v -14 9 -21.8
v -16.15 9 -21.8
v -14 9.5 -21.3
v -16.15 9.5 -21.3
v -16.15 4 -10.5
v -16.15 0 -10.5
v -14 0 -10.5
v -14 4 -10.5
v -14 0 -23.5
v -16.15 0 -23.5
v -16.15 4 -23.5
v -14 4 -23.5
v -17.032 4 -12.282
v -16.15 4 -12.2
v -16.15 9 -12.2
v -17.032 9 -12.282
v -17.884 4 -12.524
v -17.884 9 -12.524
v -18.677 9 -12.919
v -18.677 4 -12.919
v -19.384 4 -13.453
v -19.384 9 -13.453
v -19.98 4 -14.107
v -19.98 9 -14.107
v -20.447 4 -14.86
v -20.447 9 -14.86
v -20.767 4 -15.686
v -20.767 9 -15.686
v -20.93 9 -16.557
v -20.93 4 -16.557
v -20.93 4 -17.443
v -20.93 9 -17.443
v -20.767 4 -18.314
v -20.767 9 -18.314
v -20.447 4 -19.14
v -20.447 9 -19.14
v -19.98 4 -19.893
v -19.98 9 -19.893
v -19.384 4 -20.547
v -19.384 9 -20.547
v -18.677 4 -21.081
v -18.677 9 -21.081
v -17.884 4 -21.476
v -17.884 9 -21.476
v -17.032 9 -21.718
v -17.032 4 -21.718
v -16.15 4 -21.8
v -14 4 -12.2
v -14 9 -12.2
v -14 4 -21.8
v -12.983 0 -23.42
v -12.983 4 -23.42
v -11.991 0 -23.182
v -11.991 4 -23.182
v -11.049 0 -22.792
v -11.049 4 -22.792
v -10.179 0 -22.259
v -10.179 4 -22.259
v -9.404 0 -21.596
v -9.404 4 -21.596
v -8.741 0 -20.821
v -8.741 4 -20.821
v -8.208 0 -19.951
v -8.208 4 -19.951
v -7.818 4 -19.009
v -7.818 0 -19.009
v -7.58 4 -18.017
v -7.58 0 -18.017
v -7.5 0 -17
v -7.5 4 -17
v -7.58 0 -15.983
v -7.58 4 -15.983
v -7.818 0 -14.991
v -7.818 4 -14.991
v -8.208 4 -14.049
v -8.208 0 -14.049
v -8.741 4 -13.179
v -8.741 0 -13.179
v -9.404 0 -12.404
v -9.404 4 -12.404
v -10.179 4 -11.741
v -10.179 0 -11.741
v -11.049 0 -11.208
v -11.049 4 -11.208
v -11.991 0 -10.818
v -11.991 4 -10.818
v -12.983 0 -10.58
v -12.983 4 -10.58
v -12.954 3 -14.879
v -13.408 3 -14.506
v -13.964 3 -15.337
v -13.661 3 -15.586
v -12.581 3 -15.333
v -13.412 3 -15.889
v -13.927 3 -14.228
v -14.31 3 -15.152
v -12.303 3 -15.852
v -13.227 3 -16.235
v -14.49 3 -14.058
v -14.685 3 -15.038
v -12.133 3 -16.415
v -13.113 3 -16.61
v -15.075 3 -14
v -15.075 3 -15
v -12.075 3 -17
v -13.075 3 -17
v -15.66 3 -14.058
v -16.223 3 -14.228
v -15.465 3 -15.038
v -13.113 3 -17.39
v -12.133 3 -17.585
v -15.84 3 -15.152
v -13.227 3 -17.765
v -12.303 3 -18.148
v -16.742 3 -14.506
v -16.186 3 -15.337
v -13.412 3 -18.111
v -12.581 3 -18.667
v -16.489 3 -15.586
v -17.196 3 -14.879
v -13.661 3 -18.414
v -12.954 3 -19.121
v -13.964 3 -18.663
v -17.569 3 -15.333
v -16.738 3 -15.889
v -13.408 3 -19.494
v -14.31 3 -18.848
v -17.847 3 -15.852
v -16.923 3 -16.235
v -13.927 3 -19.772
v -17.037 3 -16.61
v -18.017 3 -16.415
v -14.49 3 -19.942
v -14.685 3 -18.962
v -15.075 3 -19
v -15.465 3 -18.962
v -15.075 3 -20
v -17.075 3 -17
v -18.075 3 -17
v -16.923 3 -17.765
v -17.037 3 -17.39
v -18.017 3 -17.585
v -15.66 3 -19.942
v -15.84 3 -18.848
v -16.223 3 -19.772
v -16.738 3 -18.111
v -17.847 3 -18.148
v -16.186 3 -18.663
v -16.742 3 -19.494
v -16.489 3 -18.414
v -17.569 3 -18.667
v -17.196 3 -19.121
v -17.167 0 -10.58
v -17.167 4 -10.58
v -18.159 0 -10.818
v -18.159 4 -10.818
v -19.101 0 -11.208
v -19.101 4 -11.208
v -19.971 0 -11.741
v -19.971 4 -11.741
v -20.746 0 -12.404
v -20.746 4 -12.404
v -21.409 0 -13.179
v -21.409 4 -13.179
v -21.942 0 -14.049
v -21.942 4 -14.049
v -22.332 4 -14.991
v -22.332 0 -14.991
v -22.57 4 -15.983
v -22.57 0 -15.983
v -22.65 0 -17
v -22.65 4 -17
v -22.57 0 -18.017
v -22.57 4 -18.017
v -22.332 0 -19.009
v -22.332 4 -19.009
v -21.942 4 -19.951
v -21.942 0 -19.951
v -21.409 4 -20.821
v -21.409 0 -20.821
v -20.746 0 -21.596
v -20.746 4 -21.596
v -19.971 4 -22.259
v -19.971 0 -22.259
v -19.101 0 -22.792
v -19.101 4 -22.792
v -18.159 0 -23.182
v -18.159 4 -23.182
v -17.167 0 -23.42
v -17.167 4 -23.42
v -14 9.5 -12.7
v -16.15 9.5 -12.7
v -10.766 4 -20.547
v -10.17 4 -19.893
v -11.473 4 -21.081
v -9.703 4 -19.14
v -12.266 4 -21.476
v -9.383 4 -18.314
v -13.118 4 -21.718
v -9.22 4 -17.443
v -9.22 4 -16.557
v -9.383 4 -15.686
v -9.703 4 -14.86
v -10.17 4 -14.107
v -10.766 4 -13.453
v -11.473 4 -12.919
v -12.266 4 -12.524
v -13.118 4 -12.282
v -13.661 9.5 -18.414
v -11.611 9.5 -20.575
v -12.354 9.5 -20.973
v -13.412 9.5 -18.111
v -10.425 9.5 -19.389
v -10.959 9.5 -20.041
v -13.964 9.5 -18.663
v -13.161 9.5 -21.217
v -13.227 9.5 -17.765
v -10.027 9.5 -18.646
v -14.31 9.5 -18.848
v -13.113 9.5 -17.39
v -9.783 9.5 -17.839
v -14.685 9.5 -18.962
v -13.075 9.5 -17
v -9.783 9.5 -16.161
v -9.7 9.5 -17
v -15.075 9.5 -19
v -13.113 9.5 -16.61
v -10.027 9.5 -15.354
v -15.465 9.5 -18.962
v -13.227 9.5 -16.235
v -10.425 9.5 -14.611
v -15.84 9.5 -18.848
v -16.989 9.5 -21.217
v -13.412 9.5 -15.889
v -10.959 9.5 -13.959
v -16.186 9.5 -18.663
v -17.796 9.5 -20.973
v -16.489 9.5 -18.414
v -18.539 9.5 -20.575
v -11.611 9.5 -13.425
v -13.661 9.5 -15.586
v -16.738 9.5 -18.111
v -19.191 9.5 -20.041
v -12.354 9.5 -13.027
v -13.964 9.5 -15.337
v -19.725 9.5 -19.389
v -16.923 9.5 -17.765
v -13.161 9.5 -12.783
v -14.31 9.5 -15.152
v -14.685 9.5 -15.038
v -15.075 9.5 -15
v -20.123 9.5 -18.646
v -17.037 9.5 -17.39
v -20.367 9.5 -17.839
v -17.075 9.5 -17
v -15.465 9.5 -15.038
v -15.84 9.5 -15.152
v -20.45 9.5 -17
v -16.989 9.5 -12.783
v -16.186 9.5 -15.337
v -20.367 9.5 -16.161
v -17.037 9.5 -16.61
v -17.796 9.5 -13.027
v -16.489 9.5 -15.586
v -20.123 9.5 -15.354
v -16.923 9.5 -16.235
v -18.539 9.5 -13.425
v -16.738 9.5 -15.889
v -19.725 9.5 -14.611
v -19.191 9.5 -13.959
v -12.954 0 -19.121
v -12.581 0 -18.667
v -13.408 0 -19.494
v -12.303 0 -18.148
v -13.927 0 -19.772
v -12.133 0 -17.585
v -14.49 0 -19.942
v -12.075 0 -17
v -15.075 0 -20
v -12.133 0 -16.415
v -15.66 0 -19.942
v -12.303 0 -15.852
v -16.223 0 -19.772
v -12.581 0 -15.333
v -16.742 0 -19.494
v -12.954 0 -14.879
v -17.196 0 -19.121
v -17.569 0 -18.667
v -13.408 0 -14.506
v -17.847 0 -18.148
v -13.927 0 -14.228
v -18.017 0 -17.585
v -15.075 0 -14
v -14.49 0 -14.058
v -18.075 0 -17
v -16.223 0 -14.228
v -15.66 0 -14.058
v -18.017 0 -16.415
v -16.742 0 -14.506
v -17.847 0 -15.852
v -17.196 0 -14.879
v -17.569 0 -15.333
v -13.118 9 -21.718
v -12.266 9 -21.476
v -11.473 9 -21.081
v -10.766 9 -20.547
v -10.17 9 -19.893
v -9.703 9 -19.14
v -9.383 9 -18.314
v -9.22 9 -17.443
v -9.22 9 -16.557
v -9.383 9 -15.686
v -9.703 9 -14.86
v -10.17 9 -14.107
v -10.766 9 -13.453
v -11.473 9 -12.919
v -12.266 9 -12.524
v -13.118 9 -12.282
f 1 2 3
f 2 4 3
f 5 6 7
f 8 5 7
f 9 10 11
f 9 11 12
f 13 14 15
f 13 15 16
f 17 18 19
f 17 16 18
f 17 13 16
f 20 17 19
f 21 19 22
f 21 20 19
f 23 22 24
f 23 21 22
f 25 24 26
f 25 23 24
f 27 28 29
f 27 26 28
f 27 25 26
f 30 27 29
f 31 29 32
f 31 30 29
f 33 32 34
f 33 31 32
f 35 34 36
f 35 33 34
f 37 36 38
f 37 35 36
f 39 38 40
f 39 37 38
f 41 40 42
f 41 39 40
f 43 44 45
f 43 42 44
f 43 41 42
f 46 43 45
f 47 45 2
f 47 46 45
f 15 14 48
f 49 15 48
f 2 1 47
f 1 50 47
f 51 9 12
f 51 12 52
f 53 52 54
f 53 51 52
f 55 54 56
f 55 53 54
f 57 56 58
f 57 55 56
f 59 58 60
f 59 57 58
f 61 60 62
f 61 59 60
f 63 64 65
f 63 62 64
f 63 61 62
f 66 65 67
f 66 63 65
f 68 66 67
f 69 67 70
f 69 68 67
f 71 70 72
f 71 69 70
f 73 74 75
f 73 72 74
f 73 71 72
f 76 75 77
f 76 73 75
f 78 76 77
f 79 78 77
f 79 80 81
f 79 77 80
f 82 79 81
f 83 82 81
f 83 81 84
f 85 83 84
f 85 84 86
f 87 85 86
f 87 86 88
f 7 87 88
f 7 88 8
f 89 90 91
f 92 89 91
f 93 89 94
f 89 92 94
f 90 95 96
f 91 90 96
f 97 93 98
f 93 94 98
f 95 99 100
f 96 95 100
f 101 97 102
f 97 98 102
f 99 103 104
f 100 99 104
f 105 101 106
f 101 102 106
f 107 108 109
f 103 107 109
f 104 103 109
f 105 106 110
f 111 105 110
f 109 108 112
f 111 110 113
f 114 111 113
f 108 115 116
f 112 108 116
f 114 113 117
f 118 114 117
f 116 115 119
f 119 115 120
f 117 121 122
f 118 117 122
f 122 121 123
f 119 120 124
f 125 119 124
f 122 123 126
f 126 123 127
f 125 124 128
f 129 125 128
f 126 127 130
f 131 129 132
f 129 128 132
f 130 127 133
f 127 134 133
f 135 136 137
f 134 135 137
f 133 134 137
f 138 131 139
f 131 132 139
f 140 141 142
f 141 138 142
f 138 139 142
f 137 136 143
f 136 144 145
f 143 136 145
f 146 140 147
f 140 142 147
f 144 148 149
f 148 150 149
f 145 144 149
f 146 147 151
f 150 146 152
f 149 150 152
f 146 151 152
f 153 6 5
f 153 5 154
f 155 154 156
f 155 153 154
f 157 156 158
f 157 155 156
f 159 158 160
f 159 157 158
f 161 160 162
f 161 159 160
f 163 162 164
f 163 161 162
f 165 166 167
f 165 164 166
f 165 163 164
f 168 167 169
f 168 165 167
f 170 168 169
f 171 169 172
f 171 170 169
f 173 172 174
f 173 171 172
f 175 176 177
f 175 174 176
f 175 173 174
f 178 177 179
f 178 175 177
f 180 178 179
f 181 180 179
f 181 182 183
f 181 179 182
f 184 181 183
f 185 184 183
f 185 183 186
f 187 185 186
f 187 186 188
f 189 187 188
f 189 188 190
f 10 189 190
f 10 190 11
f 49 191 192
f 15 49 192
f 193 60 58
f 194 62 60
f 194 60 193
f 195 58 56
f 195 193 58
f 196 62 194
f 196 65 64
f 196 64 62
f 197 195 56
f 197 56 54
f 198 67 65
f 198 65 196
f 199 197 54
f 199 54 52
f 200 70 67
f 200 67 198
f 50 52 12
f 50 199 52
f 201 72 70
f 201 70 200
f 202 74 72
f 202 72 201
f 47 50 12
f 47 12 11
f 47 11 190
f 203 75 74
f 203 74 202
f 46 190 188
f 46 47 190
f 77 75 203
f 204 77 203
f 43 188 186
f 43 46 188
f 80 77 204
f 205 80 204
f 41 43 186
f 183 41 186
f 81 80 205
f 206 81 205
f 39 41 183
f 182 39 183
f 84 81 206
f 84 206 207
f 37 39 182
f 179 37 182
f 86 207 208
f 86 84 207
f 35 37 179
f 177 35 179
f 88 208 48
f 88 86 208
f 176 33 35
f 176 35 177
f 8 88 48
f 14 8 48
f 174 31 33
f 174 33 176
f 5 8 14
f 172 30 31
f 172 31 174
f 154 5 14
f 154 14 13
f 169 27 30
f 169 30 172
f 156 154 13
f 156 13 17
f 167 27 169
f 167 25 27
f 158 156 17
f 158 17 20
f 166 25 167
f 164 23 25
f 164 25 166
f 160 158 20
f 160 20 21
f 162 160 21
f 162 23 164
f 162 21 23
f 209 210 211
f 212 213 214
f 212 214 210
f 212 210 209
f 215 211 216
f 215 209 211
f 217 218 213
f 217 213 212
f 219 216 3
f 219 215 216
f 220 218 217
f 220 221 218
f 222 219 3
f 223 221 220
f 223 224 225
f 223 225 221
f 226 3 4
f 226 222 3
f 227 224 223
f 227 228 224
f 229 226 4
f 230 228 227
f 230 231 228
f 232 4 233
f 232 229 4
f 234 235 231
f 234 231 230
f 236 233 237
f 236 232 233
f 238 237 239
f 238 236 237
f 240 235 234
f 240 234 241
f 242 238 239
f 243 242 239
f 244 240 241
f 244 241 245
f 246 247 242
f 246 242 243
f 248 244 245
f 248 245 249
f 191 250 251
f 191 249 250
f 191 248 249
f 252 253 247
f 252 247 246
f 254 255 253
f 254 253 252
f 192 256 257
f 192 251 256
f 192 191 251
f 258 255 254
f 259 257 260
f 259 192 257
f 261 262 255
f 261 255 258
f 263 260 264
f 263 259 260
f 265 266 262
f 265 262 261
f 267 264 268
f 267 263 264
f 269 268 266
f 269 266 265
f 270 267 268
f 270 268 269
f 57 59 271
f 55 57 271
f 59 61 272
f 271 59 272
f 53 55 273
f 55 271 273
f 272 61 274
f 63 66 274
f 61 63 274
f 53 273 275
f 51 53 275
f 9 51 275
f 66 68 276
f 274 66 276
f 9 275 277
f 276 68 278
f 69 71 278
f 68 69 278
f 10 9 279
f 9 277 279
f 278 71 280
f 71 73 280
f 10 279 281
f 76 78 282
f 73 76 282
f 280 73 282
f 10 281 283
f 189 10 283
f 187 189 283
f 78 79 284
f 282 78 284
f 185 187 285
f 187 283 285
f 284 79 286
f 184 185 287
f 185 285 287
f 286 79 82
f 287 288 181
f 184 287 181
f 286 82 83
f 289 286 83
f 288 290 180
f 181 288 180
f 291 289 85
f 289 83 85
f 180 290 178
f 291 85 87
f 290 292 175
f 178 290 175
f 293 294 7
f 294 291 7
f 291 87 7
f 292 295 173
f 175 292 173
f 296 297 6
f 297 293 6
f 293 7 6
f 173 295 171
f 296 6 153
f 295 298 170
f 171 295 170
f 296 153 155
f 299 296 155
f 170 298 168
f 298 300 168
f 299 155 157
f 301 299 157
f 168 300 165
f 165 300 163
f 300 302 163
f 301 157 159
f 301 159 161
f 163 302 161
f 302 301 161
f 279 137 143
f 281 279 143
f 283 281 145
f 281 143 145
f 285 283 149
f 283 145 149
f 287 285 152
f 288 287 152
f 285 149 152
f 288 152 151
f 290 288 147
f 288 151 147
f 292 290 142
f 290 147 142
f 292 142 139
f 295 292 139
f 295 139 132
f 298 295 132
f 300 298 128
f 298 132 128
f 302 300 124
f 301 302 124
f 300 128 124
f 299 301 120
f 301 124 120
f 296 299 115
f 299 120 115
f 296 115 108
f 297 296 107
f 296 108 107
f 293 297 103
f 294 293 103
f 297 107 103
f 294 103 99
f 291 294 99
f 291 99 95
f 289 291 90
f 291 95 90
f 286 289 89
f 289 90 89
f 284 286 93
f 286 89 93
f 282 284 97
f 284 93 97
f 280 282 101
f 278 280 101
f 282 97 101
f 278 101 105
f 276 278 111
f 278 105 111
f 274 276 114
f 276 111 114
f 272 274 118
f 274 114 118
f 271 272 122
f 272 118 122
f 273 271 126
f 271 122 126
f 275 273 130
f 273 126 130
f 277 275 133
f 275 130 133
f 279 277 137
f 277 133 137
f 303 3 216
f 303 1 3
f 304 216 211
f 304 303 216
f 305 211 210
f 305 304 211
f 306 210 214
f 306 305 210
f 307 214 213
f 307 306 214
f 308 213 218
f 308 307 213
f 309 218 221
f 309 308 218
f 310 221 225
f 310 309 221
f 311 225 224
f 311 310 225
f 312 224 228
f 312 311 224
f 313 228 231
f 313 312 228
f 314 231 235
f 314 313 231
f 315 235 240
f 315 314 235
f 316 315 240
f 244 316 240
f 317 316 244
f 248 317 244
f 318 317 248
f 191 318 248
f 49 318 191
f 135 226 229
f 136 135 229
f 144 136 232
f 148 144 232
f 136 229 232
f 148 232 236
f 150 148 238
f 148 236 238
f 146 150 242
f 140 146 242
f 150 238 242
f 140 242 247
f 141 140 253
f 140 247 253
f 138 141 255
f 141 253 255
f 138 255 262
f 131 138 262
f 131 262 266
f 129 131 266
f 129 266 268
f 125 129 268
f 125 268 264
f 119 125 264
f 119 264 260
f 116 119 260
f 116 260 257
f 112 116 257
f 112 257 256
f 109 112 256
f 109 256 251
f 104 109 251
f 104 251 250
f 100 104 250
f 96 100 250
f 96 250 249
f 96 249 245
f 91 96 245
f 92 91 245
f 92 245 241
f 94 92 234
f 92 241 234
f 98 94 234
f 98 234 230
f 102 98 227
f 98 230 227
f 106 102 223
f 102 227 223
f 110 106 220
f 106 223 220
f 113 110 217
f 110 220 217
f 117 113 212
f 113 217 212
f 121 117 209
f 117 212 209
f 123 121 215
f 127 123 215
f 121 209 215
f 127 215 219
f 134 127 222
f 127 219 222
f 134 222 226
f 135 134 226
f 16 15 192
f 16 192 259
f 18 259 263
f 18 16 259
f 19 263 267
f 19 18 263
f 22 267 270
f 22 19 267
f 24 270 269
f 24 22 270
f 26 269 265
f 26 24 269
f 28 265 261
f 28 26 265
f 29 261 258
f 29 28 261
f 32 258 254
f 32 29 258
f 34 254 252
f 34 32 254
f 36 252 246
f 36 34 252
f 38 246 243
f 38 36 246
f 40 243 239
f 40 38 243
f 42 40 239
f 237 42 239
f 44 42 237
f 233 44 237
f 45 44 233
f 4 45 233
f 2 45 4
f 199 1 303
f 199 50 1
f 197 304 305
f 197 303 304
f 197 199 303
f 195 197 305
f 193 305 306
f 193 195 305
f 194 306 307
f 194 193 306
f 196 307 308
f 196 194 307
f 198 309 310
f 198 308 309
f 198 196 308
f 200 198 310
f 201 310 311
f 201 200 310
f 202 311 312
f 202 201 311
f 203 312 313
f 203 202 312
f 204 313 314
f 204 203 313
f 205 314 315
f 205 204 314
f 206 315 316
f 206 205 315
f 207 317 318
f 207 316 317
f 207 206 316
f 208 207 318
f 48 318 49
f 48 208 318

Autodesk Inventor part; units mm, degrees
ref_plane "YZ Plane" through (0, 0, 0) normal (1, 0, 0) x (0, 1, 0)
ref_plane "XZ Plane" through (0, 0, 0) normal (0, 1, 0) x (-1, 0, 0)
ref_plane "XY Plane" through (0, 0, 0) normal (0, 0, 1) x (1, 0, 0)
sketch "Sketch1" plane through (0, 0, 0) normal (0, 1, 0) x (-1, 0, 0)
  line L0 (41.25, -2.25) -> (28.75, -2.25) construction
  line L1 (28.75, -2.25) -> (28.75, -14.75) construction
  line L2 (28.75, -14.75) -> (41.25, -14.75) construction
  line L3 (41.25, -14.75) -> (41.25, -2.25) construction
  line L4 (56.9183, -8.5) -> (8.3915, -8.5) construction
  line L5 (0, -17) -> (105, -17) construction
  line L6 (0, 0) -> (0, -51) construction
  line L7 (0, -34) -> (105, -34) construction
  line L8 (105, -51) -> (105, 0) construction
  line L9 (35, 19) -> (35, -51) construction
  line L10 (56.8064, -25.5) -> (17, -25.5) construction
  line L11 (28.75, -19.25) -> (28.75, -31.75) construction
  line L12 (41.25, -19.25) -> (28.75, -19.25) construction
  line L13 (41.25, -31.75) -> (41.25, -19.25) construction
  line L14 (28.75, -31.75) -> (41.25, -31.75) construction
  line L15 (28.75, -36.25) -> (28.75, -48.75) construction
  line L16 (41.25, -36.25) -> (28.75, -36.25) construction
  line L17 (41.25, -48.75) -> (41.25, -36.25) construction
  line L18 (28.75, -48.75) -> (41.25, -48.75) construction
  line L19 (56.3008, -42.5) -> (16.5498, -42.5) construction
  arc A0 (53.45, -12) -> (53.45, -22) centre (53.45, -17) ccw construction
  arc A1 (92, -22) -> (92, -12) centre (92, -17) ccw construction
  arc A2 (53.45, -29) -> (53.45, -39) centre (53.45, -34) ccw construction
  arc A3 (92, -39) -> (92, -29) centre (92, -34) ccw construction
  line L20 (53.45, -12) -> (92, -12) construction
  line L21 (53.45, -22) -> (92, -22) construction
  line L22 (53.45, -29) -> (92, -29) construction
  line L23 (53.45, -39) -> (92, -39) construction
  arc A4 (16.15, -38.8) -> (16.15, -29.2) centre (16.15, -34) ccw construction
  line L24 (103.5, -49.5) -> (103.5, -1.5) construction
  line L25 (1.5, -1.5) -> (1.5, -49.5) construction
  arc A5 (14, -29.2) -> (14, -38.8) centre (14, -34) ccw construction
  arc A6 (14, -12.2) -> (14, -21.8) centre (14, -17) ccw
  line L26 (16.15, -38.8) -> (14, -38.8) construction
  line L27 (14, -29.2) -> (16.15, -29.2) construction
  line L28 (14, -21.8) -> (16.15, -21.8)
  line L29 (16.15, -12.2) -> (14, -12.2)
  arc A7 (16.15, -21.8) -> (16.15, -12.2) centre (16.15, -17) ccw
  arc A8 (96.5, -51) -> (93, -47.5) centre (93, -51) ccw construction
  arc A9 (53.45, -47.5) -> (49.95, -51) centre (53.45, -51) ccw construction
  arc A10 (97.7697, -49.5) -> (93, -46) centre (93, -51) ccw construction
  line L30 (93, -46) -> (53.45, -46) construction
  line L31 (96.5, -51) -> (105, -51) construction
  line L32 (93, -47.5) -> (53.45, -47.5) construction
  line L33 (105, -49.5) -> (97.7697, -49.5) construction
  arc A11 (53.45, -46) -> (48.6803, -49.5) centre (53.45, -51) ccw construction
  arc A12 (48.6803, -1.5) -> (53.45, -5) centre (53.45, 0) ccw construction
  arc A13 (49.95, 0) -> (53.45, -3.5) centre (53.45, 0) ccw construction
  line L34 (93, -3.5) -> (53.45, -3.5) construction
  line L35 (93, -5) -> (53.45, -5) construction
  line L36 (97.7697, -1.5) -> (105, -1.5) construction
  line L37 (105, 0) -> (96.5, 0) construction
  arc A14 (93, -3.5) -> (96.5, 0) centre (93, 0) ccw construction
  arc A15 (93, -5) -> (97.7697, -1.5) centre (93, 0) ccw construction
  arc A16 (20.65, -51) -> (17.15, -47.5) centre (17.15, -51) ccw construction
  arc A17 (12, -47.5) -> (8.5, -51) centre (12, -51) ccw construction
  line L38 (17.15, -46) -> (12, -46) construction
  line L39 (17.15, -47.5) -> (12, -47.5) construction
  arc A18 (12, -46) -> (7.2303, -49.5) centre (12, -51) ccw construction
  arc A19 (21.9197, -49.5) -> (17.15, -46) centre (17.15, -51) ccw construction
  line L40 (48.6803, -49.5) -> (21.9197, -49.5) construction
  line L41 (7.2303, -49.5) -> (0, -49.5) construction
  line L42 (0, -51) -> (8.5, -51) construction
  line L43 (20.65, -51) -> (49.95, -51) construction
  line L44 (17.15, -5) -> (12, -5) construction
  line L45 (17.15, -3.5) -> (12, -3.5) construction
  arc A20 (8.5, 0) -> (12, -3.5) centre (12, 0) ccw construction
  arc A21 (17.15, -3.5) -> (20.65, 0) centre (17.15, 0) ccw construction
  arc A22 (7.2303, -1.5) -> (12, -5) centre (12, 0) ccw construction
  arc A23 (17.15, -5) -> (21.9197, -1.5) centre (17.15, 0) ccw construction
  line L46 (49.95, 0) -> (20.65, 0) construction
  line L47 (8.5, 0) -> (0, 0) construction
  line L48 (0, -1.5) -> (7.2303, -1.5) construction
  line L49 (21.9197, -1.5) -> (48.6803, -1.5) construction
  line L50 (113, 2) -> (-20, 2) construction
  line L51 (-20, 2) -> (-20, -53) construction
  line L52 (-20, -53) -> (113, -53) construction
  line L53 (113, -53) -> (113, 2) construction
  arc A24 (92, -23.5) -> (92, -10.5) centre (92, -17) ccw construction
  arc A25 (53.45, -10.5) -> (53.45, -23.5) centre (53.45, -17) ccw construction
  line L54 (92, -10.5) -> (53.45, -10.5) construction
  line L55 (53.45, -23.5) -> (92, -23.5) construction
  line L56 (15.075, -18.8909) -> (15.075, -15) construction
  arc A26 (16.15, -23.5) -> (16.15, -10.5) centre (16.15, -17) ccw
  arc A27 (14, -10.5) -> (14, -23.5) centre (14, -17) ccw
  line L57 (16.15, -23.5) -> (14, -23.5)
  line L58 (16.15, -10.5) -> (14, -10.5)
  point P0 (35, -8.5)
  point P1 (35, -42.5)
  point P2 (35, -25.5)
  point P3 (15.075, -17)
  dimension "d0" = 12.5
  dimension "d1" = 12.5
  dimension "d2" = 17
  dimension "d3" = 35
  dimension "d4" = 105
  dimension "d5" = 17
  dimension "d6" = 17
  dimension "d7" = 10
  dimension "d8" = 1.5
  dimension "d9" = 1.5
  dimension "d10" = 4.8
  dimension "d11" = 1.5
  dimension "d12" = 1.5
  dimension "d13" = 1.5
  dimension "d14" = 17
  dimension "d15" = 17
  dimension "d16" = 12
  dimension "d17" = 13
  dimension "d18" = 12.2
  dimension "d19" = 11.6
  dimension "d20" = 12.6
  dimension "d21" = 12
  dimension "d22" = 12.5
  dimension "d23" = 2
  dimension "d24" = 8
  dimension "d25" = 20
  dimension "d26" = 1.5
extrude "Extrusion3" add sketch "Sketch1" along normal blind 9.5 contours L29 A7 L28 A6
extrude "Extrusion4" add sketch "Sketch1" along normal blind 4
hole "Hole2" at (-35, 0, -8.5) at (0, 0, -17) at (-35, 0, -42.5) at (-35, 0, -25.5) at (-92, 0, -17) at (-53.45, 0, -17) at (-15.075, 0, -17) direction (0, 1, 0) diameter 4 end through all counterbore diameter 6 counterbore depth 3
chamfer "Chamfer2" distance 0.5 angle 45 4 edges at (-9.2, 9.5, -17) (-15.075, 9.5, -21.8) (-20.95, 9.5, -17) (-15.075, 9.5, -12.2)
properties part number "Small_retainer"
